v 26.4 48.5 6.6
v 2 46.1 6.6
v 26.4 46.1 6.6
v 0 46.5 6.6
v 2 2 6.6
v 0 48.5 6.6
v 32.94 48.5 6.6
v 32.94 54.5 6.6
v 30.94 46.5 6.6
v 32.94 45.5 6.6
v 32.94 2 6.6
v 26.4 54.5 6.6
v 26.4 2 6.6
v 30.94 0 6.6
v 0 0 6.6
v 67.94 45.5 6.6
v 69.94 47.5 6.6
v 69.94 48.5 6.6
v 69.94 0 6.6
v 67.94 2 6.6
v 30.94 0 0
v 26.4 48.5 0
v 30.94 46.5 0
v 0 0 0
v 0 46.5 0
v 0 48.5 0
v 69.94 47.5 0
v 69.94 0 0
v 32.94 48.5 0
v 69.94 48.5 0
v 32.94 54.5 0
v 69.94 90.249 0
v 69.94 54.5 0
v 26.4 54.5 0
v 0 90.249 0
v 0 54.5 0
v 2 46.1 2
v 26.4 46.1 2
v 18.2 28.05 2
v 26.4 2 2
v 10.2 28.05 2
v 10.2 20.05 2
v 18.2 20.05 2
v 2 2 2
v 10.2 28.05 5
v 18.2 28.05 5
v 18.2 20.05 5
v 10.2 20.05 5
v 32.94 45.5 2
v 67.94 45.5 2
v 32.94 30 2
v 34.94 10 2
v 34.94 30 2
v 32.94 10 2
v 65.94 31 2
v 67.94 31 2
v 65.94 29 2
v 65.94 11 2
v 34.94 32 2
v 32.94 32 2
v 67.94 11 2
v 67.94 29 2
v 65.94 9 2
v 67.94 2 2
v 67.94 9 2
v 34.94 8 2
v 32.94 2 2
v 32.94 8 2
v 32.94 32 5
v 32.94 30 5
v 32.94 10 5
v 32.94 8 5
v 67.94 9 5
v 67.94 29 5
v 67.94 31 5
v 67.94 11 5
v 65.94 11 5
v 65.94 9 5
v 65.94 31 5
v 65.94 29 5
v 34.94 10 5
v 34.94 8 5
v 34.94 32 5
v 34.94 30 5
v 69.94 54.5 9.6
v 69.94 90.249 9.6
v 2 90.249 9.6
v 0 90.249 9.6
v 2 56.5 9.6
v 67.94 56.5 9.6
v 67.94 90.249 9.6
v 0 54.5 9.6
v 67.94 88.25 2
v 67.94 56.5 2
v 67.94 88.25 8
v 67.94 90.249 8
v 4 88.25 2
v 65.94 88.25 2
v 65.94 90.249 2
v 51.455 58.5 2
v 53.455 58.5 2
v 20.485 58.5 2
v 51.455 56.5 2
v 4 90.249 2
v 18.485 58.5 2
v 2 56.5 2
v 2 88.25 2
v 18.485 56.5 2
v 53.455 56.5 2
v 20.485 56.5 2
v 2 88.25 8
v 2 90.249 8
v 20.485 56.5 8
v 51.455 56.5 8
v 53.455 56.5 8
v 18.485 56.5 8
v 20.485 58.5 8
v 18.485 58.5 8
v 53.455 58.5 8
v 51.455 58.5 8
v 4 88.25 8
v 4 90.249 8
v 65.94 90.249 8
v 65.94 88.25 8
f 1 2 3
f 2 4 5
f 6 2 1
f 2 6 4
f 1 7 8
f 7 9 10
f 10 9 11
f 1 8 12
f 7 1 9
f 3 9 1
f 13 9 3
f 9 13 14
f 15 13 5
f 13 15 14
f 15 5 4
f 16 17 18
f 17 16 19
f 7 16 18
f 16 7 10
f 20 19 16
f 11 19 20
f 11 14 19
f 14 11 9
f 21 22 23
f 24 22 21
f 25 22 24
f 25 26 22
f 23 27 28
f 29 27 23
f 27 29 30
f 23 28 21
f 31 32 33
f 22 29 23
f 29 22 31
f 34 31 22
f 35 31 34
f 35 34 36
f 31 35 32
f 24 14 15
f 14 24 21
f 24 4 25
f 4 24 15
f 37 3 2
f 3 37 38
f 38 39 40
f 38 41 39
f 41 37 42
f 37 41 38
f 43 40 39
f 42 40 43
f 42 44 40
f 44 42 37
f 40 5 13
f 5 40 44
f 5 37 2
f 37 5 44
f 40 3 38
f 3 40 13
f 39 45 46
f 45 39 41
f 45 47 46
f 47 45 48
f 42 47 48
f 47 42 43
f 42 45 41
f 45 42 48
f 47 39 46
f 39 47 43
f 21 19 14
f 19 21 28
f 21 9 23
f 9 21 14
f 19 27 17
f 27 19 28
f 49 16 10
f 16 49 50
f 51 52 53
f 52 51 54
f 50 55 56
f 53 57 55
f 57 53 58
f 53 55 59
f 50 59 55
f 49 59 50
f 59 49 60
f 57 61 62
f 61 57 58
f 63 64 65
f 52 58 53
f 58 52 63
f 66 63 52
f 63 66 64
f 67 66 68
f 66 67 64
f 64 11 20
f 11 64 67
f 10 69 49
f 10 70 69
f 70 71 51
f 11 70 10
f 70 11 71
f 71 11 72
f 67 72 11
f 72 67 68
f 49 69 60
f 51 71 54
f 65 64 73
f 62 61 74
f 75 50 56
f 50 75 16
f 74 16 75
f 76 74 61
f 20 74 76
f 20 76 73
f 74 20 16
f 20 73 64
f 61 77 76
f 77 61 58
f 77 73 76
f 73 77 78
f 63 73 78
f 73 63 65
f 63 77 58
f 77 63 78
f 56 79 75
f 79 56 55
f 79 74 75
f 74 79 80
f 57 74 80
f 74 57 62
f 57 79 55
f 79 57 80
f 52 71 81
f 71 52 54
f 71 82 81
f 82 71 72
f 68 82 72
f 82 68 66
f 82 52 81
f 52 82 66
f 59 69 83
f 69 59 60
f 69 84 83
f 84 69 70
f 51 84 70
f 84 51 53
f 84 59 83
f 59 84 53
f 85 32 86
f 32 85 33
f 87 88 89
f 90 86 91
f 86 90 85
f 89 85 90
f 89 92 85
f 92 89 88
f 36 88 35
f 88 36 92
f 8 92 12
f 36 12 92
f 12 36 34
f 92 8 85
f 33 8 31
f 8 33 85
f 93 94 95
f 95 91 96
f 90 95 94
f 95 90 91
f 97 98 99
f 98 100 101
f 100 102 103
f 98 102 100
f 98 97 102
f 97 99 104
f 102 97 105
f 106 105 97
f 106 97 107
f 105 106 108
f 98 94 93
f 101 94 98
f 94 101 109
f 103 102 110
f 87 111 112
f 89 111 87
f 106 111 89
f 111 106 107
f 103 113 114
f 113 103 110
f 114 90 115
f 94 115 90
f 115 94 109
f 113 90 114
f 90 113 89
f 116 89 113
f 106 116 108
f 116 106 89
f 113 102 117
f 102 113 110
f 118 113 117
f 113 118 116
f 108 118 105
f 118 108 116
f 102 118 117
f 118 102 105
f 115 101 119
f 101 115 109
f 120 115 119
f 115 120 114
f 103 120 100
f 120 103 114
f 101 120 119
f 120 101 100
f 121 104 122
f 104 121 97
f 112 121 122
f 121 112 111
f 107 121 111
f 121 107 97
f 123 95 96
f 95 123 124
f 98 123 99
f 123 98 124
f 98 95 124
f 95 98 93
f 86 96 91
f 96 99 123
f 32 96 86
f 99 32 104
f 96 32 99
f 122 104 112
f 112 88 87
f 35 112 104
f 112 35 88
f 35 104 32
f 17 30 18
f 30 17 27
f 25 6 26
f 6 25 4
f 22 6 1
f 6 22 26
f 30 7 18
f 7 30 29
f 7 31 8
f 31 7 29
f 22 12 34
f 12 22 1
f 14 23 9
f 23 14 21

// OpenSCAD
// file: pcb-model-sizes.scad
pcbSmtLvSize=[65.94, 33.75];
pcbDevkitcRelaySize=[57.53, 31.88];
pcbCurrentSensorSize=[43.5, 35];
pcbContactorPsuSize=[44.1, 24.4];
pcbContactorInterfaceRelaySize=[41.3,34.8];

pcbRelayHeight = 16;
pcbTallCompoent = 15;
pcbShortComponent = 6;

pcbThickness = 1.6;
solderThickness = 3;
wallThickness = 1.5;
partitionThickness = 0.8;

caseMargin = 0.2;
// file: bento-pcb-containers.scad
include <pcb-model-sizes.scad>

relayTopStands=[9, 42];
relayBottomStands = [12, 41];

module bentoRelay(wallThickness=[2,2,2], solderThickness=3, boardThickness=1.6, standSize = 2) {
    difference() {
        cube([wallThickness[0] * 2 + pcbDevkitcRelaySize[0], wallThickness[1] * 2 + pcbDevkitcRelaySize[1], wallThickness[2] + solderThickness + boardThickness]);
        translate([wallThickness[0], wallThickness[1], wallThickness[2]]) {
            cube([pcbDevkitcRelaySize[0], pcbDevkitcRelaySize[1], solderThickness + boardThickness + 0.01]);
        }
    }
    translate(wallThickness) {
        for(stand = relayBottomStands) {
            translate([stand, 0, 0]){
               cube([standSize, standSize, solderThickness]);
            }
        }
    }
    translate(wallThickness + [0, pcbDevkitcRelaySize[1] - standSize, 0]) {
        for(stand = relayTopStands) {
            translate([stand, 0, 0]){
               cube([standSize, standSize, solderThickness]);
            }
        }
    }
}

bentoRelay();


currentTopStands=[6, 28];
currentBottomStands = [7, 27];

module bentoCurrentSensor(wallThickness=[2,2,2], solderThickness=3, boardThickness=1.6, standSize = 2) {
    difference() {
        cube([wallThickness[0] * 2 + pcbCurrentSensorSize[0], wallThickness[1] * 2 + pcbCurrentSensorSize[1], wallThickness[2] + solderThickness + boardThickness]);
        translate([wallThickness[0], wallThickness[1], wallThickness[2]]) {
            cube([pcbCurrentSensorSize[0], pcbCurrentSensorSize[1], solderThickness + boardThickness + 0.01]);
        }
    }
    translate(wallThickness) {
        for(stand = currentBottomStands) {
            translate([stand, 0, 0]){
               cube([standSize, standSize, solderThickness]);
            }
        }
    }
    translate(wallThickness + [0, pcbCurrentSensorSize[1] - standSize, 0]) {
        for(stand = currentTopStands) {
            translate([stand, 0, 0]){
               cube([standSize, standSize, solderThickness]);
            }
        }
    }
}

translate([80, 0, 0]) {
    bentoCurrentSensor();
}


smtLvTopStands=[0, pcbSmtLvSize[0] - 2 ];
smtLvBottomStands=[pcbSmtLvSize[0]/4, pcbSmtLvSize[0] - pcbSmtLvSize[0]/4 ];

module bentoSmtLv(wallThickness=[2,2,2], solderThickness=3, boardThickness=1.6, standSize = 2, topWall=true) {
    difference() {
        cube([wallThickness[0] * (topWall ? 2 : 1) + pcbSmtLvSize[0], wallThickness[1] * 2 + pcbSmtLvSize[1], wallThickness[2] + solderThickness + boardThickness]);
        translate([wallThickness[0], wallThickness[1], wallThickness[2]]) {
            cube([pcbSmtLvSize[0], pcbSmtLvSize[1], solderThickness + boardThickness + 0.01]);
        }
    }
    translate(wallThickness) {
        for(stand = smtLvBottomStands) {
            translate([stand, 0, 0]){
               cube([standSize, standSize, solderThickness]);
            }
        }
    }
    translate(wallThickness + [0, pcbSmtLvSize[1] - standSize, 0]) {
        for(stand = smtLvTopStands) {
            translate([stand, 0, 0]){
               cube([standSize, standSize, solderThickness]);
            }
        }
    }
}

translate([140, 0, 0]) {
    bentoSmtLv();
}


echo(pcbContactorPsuSize[0]);

module bentoContactorPsu(wallThickness=[2,2,2], solderThickness=3, boardThickness=1.6, standSize = 2) {
    difference() {
        cube([wallThickness[0] * 2 + pcbContactorPsuSize[0], wallThickness[1] * 2 + pcbContactorPsuSize[1], wallThickness[2] + solderThickness + boardThickness]);
        translate([wallThickness[0], wallThickness[1], wallThickness[2]]) {
            cube([pcbContactorPsuSize[0], pcbContactorPsuSize[1], solderThickness + boardThickness + 0.01]);
        }
    }

    translate([wallThickness[0] + pcbContactorPsuSize[0] / 2 - 2 * standSize, wallThickness[1] + pcbContactorPsuSize[1] / 2 - 2 * standSize, wallThickness[2]]) {
        cube([4 * standSize, 4 * standSize, solderThickness]);
    }
}

translate([220, 0, 0]) {
    bentoContactorPsu();
}

currentMiniTopStands=[6, 28];
currentMiniBottomStands = [7, 27];

module bentoCurrentSensorMini(wallThickness=[2,2,2], solderThickness=3, boardThickness=1.6, standSize = 2) {
    difference() {
        cube([wallThickness[0] * 2 + pcbCurrentSensorMiniSize[0], wallThickness[1] * 2 + pcbCurrentSensorMiniSize[1], wallThickness[2] + solderThickness + boardThickness]);
        translate([wallThickness[0], wallThickness[1], wallThickness[2]]) {
            cube([pcbCurrentSensorMiniSize[0], pcbCurrentSensorMiniSize[1], solderThickness + boardThickness + 0.01]);
        }
    }
    translate(wallThickness) {
        for(stand = currentBottomStands) {
            translate([stand, 0, 0]){
               cube([standSize, standSize, solderThickness]);
            }
        }
    }
    translate(wallThickness + [0, pcbCurrentSensorMiniSize[1] - standSize, 0]) {
        for(stand = currentTopStands) {
            translate([stand, 0, 0]){
               cube([standSize, standSize, solderThickness]);
            }
        }
    }
}

translate([280, 0, 0]) {
    bentoCurrentSensorMini();
}
// main file
use <bento-pcb-containers.scad>
include <pcb-model-sizes.scad>

wallThickness = [2, 2, 2];

dinWidth = wallThickness[2] + solderThickness + pcbThickness;

module dinClip() {
	translate([-.15,0,0])linear_extrude(height=dinWidth, convexity=5) {
		import(file="../pcb/din_clip_01a.dxf", layer="0", $fn=64);
	}
}

rotate([0, 0, -90]) {
    dinClip();
}

translate([wallThickness[0] * 2 + pcbContactorPsuSize[1],0,0]) {
    rotate([0,0, 90]) {
        bentoContactorPsu();
    }
}

edgeStrip = (wallThickness[0] * 2 + pcbSmtLvSize[0]) - (wallThickness[0] * 4 + pcbContactorPsuSize[1] + pcbCurrentSensorSize[1]);

translate([wallThickness[0] * 2 + pcbContactorPsuSize[1], 0, 0]) {
    cube([edgeStrip, wallThickness[0] * 2 + pcbContactorPsuSize[0], dinWidth]); 
}

translate([edgeStrip + wallThickness[0] * 2 + pcbContactorPsuSize[1] + wallThickness[0] * 2 + pcbCurrentSensorSize[1],0,0]) {
    rotate([0,0, 90]) {
        bentoCurrentSensor();
    }
}

translate([0, wallThickness[0] * 1.5 + pcbCurrentSensorSize[0], 0]) {
    cube([2 * wallThickness[0] + pcbSmtLvSize[0], wallThickness[0], dinWidth]);

    translate([wallThickness[0] * 1 + pcbContactorPsuSize[1], 0, 0]) {
        cube([wallThickness[0] * 2 + edgeStrip, 4 * wallThickness[0], dinWidth]); 
    }

    translate([0,4 * wallThickness[0], 0]) {
        rotate([0, 0, 0]) {
            difference() {
                bentoSmtLv(solderThickness = solderThickness + 3);
                translate([0, 1 * wallThickness[1] + pcbSmtLvSize[1] - 0.001, 0]) {
                    cube([2 * wallThickness[0] + pcbSmtLvSize[0],wallThickness[1] + 0.002, dinWidth + 3 + 0.01]);
                }
            }
        }
    }
}
